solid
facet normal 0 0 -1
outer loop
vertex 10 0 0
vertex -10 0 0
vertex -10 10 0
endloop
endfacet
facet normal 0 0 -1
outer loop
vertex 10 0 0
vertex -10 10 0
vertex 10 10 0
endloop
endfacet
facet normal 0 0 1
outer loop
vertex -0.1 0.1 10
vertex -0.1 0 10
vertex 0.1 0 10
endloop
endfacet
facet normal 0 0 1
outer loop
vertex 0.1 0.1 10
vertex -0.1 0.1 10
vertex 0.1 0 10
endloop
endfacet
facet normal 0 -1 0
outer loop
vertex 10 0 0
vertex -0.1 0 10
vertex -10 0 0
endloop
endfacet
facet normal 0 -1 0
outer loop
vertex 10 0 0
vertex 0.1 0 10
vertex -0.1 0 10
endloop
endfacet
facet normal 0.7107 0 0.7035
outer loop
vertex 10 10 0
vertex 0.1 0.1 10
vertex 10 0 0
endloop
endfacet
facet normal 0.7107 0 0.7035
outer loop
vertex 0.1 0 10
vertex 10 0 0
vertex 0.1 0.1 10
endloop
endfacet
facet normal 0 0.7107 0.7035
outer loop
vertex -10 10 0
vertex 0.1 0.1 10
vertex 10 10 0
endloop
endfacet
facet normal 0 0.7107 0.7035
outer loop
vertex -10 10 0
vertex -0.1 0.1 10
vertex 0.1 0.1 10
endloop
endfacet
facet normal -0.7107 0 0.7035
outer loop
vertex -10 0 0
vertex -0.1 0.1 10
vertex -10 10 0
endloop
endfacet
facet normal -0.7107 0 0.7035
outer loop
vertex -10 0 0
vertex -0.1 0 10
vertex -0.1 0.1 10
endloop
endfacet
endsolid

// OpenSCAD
// Create a half-pyramid from a single linear extrusion
module halfpyramid(base, height) {
   linear_extrude(height, scale=0.01)
      translate([-base/2, 0, 0]) square([base, base/2]);
}

halfpyramid(20, 10);
